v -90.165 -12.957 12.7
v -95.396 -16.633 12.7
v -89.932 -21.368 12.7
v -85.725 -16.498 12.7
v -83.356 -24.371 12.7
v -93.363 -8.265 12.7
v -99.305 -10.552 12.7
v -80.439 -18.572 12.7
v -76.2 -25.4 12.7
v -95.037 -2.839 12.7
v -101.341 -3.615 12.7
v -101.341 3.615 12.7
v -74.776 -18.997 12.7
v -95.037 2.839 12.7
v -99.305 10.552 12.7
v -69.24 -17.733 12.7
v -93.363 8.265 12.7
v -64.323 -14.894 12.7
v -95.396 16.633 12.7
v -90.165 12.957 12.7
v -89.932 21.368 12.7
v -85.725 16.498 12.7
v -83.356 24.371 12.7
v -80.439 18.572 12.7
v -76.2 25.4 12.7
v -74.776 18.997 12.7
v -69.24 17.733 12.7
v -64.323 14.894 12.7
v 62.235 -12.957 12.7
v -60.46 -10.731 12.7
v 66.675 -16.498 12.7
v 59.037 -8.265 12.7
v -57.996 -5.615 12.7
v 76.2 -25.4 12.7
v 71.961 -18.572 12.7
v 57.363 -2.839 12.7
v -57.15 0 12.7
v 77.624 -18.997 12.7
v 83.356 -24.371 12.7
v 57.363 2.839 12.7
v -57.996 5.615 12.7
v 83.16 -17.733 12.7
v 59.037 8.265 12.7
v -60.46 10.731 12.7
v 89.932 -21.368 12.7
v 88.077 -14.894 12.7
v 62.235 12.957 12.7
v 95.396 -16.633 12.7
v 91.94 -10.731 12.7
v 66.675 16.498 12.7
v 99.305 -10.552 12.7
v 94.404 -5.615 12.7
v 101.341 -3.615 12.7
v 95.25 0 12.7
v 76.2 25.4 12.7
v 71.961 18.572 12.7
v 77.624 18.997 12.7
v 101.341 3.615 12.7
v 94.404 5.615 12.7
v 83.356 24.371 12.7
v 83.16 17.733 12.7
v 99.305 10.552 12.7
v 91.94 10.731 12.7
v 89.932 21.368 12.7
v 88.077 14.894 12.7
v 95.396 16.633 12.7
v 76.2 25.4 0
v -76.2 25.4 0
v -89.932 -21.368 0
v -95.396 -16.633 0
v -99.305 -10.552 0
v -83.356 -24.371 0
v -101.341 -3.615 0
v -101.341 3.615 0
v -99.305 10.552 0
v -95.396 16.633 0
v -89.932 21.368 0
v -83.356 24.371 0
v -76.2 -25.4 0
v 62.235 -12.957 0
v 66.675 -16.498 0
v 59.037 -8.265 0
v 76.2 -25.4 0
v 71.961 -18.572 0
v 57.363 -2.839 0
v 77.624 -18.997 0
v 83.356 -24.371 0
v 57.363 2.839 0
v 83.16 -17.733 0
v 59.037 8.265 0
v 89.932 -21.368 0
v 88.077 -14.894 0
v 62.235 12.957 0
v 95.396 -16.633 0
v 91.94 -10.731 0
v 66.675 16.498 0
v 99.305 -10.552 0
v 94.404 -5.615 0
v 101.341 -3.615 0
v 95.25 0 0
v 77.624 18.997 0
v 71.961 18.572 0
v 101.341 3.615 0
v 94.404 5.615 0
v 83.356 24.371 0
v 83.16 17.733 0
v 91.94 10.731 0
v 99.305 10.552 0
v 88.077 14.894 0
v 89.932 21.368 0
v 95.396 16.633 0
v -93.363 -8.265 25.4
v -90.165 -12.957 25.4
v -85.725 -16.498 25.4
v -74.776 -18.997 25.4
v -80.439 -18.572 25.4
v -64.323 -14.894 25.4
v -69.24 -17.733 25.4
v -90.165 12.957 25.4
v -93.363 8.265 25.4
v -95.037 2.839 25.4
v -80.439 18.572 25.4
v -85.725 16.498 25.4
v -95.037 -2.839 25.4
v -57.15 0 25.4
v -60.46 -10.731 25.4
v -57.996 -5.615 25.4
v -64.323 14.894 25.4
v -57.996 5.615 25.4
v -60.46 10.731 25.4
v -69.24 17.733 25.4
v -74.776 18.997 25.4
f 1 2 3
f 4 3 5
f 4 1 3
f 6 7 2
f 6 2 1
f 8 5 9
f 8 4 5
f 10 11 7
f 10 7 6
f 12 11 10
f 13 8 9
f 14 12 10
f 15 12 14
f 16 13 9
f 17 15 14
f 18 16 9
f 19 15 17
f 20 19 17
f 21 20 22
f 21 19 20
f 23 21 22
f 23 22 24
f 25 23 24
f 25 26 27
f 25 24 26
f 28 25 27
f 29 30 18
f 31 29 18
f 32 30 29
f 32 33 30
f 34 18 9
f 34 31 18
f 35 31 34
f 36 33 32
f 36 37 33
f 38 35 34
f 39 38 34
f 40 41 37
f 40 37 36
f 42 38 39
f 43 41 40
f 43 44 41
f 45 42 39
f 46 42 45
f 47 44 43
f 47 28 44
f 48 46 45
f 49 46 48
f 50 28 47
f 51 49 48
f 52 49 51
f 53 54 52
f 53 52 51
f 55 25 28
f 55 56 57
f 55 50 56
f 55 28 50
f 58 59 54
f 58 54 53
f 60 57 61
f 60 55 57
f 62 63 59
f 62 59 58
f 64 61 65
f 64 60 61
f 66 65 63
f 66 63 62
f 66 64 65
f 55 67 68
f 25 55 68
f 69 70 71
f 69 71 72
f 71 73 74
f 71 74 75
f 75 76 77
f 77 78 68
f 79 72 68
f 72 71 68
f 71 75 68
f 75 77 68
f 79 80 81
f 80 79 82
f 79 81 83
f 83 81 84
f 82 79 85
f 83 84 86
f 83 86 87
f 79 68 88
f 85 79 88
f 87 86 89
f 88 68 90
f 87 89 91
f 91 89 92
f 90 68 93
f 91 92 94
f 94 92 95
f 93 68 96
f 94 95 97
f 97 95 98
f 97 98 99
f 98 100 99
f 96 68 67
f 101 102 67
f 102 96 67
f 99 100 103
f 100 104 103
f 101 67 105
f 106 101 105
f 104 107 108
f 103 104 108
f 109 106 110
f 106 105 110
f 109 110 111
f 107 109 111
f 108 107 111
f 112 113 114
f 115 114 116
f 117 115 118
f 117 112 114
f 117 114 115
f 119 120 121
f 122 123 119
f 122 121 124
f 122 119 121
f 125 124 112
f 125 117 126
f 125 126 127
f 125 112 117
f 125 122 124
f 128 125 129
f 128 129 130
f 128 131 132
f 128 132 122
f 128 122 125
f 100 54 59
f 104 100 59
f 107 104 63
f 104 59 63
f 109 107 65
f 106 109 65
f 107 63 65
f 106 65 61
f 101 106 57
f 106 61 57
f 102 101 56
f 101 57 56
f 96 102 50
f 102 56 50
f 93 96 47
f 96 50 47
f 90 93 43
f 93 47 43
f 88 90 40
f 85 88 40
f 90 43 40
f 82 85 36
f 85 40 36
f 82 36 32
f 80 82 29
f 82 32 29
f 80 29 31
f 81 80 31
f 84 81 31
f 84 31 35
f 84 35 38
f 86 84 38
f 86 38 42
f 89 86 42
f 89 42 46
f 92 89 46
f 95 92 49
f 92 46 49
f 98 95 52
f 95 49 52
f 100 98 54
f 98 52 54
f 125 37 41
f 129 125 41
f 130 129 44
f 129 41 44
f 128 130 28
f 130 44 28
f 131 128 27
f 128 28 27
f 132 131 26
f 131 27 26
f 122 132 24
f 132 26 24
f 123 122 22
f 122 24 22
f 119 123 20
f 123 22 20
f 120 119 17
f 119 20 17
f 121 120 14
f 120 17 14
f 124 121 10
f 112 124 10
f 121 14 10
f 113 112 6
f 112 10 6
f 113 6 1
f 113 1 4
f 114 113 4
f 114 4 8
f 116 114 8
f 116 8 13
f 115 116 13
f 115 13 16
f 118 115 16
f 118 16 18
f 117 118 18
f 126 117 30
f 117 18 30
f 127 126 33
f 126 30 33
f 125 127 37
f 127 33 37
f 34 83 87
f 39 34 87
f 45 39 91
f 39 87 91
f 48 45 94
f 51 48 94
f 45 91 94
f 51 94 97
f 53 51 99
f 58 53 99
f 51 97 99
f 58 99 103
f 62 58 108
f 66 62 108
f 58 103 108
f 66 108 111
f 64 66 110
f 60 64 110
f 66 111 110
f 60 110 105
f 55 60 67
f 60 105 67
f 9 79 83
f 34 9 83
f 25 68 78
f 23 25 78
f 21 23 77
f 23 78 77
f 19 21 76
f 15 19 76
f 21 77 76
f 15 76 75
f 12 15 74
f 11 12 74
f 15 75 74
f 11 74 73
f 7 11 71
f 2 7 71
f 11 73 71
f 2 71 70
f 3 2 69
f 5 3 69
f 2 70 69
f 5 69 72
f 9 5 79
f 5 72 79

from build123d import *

# Parameters (mm, degrees)
F2_DEPTH = 12.7
F3_R     = 19.05
F4_DEPTH = 12.7
F5_DEPTH = 12.7


# Not quite as in the source:
# - a variable given as a bare number and used for a length is read in inches; the dataset says mm whatever the document's units were


with BuildPart() as f2:
    # F1 (on Top) → F2 (new body)
    with BuildSketch(Plane.XY):
        with BuildLine():
            Line((-76.2, -25.4), (76.2, -25.4))
            ThreePointArc((76.2, -25.4), (101.6, 0), (76.2, 25.4))
            Line((76.2, 25.4), (-76.2, 25.4))
            ThreePointArc((-76.2, 25.4), (-101.6, 0), (-76.2, -25.4))
        make_face()
    extrude(amount=F2_DEPTH)

    # F3 (on face) → F4 (join)
    with BuildSketch(Plane.XY.offset(12.7)):
        with Locations((-76.2, 0)):
            Circle(F3_R)
    extrude(amount=F4_DEPTH)

    # F3 (on face) → F5 (cut)
    with BuildSketch(Plane.XY.offset(12.7)):
        with Locations((76.2, 0)):
            Circle(F3_R)
    extrude(amount=-F5_DEPTH, mode=Mode.SUBTRACT)


solid = f2.part
